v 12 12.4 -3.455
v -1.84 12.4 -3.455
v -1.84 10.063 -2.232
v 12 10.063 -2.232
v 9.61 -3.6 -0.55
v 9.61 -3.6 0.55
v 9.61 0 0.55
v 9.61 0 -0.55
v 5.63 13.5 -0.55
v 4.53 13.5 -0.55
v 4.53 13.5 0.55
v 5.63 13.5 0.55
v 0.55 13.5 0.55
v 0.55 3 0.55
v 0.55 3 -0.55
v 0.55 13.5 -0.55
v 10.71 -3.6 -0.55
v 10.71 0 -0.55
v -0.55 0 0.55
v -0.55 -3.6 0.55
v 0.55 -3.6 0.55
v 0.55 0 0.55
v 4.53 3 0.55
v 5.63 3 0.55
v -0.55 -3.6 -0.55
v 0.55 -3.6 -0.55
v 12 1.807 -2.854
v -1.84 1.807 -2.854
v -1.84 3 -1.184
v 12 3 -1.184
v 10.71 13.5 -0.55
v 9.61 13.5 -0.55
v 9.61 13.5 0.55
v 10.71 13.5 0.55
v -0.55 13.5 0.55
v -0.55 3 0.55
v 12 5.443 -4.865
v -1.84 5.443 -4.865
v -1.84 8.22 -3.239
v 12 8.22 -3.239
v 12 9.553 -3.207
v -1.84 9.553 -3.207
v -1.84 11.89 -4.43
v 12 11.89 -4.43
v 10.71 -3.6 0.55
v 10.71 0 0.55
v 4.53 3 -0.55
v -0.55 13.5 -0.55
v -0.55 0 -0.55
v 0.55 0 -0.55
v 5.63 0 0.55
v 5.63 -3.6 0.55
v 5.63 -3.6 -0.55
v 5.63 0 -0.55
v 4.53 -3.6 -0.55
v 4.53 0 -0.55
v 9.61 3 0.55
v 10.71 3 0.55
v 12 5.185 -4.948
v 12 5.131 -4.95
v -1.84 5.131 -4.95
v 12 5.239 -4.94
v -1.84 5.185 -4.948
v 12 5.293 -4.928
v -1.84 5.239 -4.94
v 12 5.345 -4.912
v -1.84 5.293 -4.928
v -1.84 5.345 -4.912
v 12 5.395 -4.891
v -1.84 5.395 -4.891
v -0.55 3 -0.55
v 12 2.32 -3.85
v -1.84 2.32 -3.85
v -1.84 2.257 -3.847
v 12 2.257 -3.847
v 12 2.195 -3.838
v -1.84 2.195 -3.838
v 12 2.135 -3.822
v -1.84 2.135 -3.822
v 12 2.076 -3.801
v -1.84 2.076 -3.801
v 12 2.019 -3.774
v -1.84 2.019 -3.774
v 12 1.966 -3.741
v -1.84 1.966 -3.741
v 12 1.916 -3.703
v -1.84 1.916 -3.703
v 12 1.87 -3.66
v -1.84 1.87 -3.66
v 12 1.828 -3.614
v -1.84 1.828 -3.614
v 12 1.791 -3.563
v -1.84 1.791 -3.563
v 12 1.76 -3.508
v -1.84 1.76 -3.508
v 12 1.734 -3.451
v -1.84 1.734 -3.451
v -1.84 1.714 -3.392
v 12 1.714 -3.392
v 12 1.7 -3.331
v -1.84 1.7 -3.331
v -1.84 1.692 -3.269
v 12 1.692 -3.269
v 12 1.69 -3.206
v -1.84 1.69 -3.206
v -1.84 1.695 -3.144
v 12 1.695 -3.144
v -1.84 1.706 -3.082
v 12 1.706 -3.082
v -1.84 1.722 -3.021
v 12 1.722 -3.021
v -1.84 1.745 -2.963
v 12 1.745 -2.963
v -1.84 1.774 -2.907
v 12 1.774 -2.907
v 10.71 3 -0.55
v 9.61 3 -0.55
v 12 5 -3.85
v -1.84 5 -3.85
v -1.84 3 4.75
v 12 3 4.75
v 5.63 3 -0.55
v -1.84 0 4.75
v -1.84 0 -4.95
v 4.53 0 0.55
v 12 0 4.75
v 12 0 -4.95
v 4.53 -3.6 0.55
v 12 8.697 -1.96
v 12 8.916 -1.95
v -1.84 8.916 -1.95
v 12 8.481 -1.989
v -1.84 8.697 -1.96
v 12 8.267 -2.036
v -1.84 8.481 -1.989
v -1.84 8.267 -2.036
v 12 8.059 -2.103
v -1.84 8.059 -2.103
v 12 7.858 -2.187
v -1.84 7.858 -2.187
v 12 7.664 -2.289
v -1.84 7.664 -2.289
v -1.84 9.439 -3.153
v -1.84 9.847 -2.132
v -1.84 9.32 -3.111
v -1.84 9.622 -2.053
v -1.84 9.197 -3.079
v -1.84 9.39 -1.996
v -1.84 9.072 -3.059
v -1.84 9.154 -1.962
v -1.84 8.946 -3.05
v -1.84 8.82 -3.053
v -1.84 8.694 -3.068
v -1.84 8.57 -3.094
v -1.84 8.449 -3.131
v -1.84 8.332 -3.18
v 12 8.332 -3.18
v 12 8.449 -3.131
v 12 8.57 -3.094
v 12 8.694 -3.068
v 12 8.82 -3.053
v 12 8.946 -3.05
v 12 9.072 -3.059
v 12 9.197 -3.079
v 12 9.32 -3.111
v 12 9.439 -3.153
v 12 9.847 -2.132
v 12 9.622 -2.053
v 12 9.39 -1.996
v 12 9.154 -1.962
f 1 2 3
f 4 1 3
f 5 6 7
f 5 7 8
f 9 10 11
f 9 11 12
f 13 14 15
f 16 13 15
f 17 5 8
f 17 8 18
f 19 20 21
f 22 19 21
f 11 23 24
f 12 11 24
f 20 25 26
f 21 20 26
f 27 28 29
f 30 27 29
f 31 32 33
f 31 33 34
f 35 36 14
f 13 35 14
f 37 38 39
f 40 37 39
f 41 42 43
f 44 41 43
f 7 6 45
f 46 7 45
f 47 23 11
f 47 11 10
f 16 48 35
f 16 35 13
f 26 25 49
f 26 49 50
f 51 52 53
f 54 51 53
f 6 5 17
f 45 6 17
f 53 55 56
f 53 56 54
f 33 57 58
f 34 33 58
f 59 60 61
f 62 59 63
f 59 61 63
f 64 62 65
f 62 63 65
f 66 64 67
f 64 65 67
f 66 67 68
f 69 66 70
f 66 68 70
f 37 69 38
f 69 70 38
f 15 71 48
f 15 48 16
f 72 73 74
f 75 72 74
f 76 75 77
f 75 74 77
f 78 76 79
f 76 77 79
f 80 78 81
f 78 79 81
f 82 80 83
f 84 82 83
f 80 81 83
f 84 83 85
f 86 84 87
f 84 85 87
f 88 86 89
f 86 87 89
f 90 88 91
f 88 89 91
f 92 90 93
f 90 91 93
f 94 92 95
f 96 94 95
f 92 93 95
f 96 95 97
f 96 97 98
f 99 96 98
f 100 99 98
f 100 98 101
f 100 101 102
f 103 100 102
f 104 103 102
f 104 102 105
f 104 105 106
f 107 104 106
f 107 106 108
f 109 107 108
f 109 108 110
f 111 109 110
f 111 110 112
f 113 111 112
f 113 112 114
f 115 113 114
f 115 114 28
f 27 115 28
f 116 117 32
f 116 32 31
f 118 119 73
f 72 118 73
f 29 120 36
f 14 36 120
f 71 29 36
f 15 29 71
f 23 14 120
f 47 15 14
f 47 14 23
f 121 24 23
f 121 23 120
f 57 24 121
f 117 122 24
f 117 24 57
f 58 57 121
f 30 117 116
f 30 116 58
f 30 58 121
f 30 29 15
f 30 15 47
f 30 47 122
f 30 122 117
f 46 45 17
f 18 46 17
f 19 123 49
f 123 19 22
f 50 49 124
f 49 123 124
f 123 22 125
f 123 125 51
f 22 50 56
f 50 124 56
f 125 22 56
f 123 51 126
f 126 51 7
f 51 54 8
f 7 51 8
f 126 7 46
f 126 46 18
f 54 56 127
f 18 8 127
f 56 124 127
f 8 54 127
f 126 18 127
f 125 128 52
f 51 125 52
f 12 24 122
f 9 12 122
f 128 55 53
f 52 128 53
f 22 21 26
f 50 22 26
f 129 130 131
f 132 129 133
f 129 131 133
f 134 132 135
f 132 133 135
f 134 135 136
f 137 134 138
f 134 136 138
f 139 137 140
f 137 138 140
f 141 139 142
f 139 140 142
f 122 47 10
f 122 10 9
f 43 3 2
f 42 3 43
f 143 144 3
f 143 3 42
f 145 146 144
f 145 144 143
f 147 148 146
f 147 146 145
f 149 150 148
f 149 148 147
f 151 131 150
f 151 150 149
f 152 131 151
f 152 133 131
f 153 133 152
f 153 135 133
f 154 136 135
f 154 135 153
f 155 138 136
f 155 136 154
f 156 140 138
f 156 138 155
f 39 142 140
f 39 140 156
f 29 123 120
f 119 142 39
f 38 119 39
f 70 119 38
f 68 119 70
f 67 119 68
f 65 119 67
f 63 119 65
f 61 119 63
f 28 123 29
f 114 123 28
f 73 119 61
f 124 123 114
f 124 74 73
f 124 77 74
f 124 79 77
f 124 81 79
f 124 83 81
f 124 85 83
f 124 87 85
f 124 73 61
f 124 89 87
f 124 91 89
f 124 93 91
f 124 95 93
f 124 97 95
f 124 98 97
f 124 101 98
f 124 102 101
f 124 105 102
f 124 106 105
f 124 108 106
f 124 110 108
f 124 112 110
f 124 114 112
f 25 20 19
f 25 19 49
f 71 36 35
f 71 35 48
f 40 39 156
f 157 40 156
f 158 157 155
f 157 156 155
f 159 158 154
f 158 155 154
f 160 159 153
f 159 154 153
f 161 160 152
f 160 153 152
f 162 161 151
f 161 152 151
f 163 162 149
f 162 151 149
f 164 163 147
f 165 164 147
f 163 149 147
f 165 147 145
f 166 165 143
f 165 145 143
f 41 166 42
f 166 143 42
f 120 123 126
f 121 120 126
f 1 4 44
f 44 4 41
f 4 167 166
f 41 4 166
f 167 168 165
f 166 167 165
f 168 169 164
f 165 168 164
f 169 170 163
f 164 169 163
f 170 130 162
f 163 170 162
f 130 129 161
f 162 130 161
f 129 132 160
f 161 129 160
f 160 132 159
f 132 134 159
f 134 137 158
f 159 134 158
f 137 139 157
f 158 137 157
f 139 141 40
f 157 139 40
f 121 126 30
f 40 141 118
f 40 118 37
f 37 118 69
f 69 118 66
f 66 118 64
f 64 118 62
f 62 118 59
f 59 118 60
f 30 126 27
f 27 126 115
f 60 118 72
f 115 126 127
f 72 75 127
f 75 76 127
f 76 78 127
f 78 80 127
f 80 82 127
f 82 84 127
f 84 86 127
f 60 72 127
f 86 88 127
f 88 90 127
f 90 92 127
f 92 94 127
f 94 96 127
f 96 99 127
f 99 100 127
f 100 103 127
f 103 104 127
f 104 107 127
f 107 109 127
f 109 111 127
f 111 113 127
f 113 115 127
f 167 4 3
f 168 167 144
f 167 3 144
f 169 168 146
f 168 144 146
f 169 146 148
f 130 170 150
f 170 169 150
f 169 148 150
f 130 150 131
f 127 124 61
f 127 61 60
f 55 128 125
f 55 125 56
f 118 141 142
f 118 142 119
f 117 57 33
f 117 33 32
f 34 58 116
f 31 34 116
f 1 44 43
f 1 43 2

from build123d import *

# Parameters (mm, degrees)
CROQUIS1_W                   = 13.84
CROQUIS1_H                   = 9.7
CROQUIS1_W_2                 = 1.1
CROQUIS1_H_2                 = 1.1
SALIENTE_EXTRUIR1_DEPTH      = 3
CROQUIS2_W                   = 13.84
CROQUIS2_H                   = 3
SALIENTE_EXTRUIR2_DEPTH      = 9.4
CORTAR_EXTRUIR1_DEPTH        = 16.490841585
SALIENTE_EXTRUIR3_DEPTH      = 13.5
SALIENTE_EXTRUIR3_DEPTH_BACK = 3.6
CROQUIS5_W                   = 1.1
CROQUIS5_H                   = 1.1


with BuildPart() as part:
    # Croquis1 → Saliente-Extruir1 (new body)
    with BuildSketch(Plane(origin=(0, 0, 0), x_dir=(1, 0, 0), z_dir=(0, 1, 0))):
        with Locations((5.08, 0.1)):
            Rectangle(CROQUIS1_W, CROQUIS1_H)
        Rectangle(CROQUIS1_W_2, CROQUIS1_H_2, mode=Mode.SUBTRACT)
        with Locations((10.16, 0)):
            Rectangle(CROQUIS1_W_2, CROQUIS1_H_2, mode=Mode.SUBTRACT)
        with Locations((5.08, 0)):
            Rectangle(CROQUIS1_W_2, CROQUIS1_H_2, mode=Mode.SUBTRACT)
    extrude(amount=SALIENTE_EXTRUIR1_DEPTH)

    # Croquis2 → Saliente-Extruir2 (add)
    with BuildSketch(Plane(origin=(0, 3, 0), x_dir=(1, 0, 0), z_dir=(0, 1, 0))):
        with Locations((5.08, 3.45)):
            Rectangle(CROQUIS2_W, CROQUIS2_H)
    extrude(amount=SALIENTE_EXTRUIR2_DEPTH)

    # Croquis3 → Cortar-Extruir1 (cut)
    with BuildSketch(Plane.ZY.offset(1.84)):
        with BuildLine():
            Line((-4.95, 12.4), (-4.95, 5.130923429))
            ThreePointArc((-4.95, 5.130923429), (-4.928460036, 5.292584893), (-4.865343077, 5.442966568))
            Line((-4.865343077, 5.442966568), (-3.238584298, 8.220392257))
            ThreePointArc((-3.238584298, 8.220392257), (-3.050389859, 8.882763545), (-3.206840185, 9.553342522))
            Line((-3.206840185, 9.553342522), (-4.429874218, 11.889875107))
            Line((-4.429874218, 11.889875107), (-3.455311447, 12.4))
            Line((-3.455311447, 12.4), (-4.95, 12.4))
        make_face()
        with BuildLine():
            Line((-1.95, 12.4), (-3.455311447, 12.4))
            Line((-3.455311447, 12.4), (-2.232277415, 10.063467416))
            ThreePointArc((-2.232277415, 10.063467416), (-2.021605007, 9.506586156), (-1.95, 8.9155089))
            Line((-1.95, 8.9155089), (-1.95, 12.4))
        make_face()
        with BuildLine():
            Line((-1.95, 3), (-1.95, 8.9155089))
            ThreePointArc((-1.95, 8.9155089), (-2.036358841, 8.267369623), (-2.28940975, 7.664453701))
            Line((-2.28940975, 7.664453701), (-3.85, 5))
            Line((-3.85, 5), (-3.85, 2.319959731))
            ThreePointArc((-3.85, 2.319959731), (-3.508458272, 1.760049187), (-2.854318236, 1.807497933))
            Line((-2.854318236, 1.807497933), (-1.184444515, 3))
            Line((-1.184444515, 3), (-1.95, 3))
        make_face()
    extrude(amount=-CORTAR_EXTRUIR1_DEPTH, mode=Mode.SUBTRACT)

    # Croquis5 → Saliente-Extruir3 (add, two sides: drawn at the far end of the back side and taken through both)
    with BuildSketch(Plane(origin=(0, 0, 0), x_dir=(1, 0, 0), z_dir=(0, 1, 0)).offset(-SALIENTE_EXTRUIR3_DEPTH_BACK)):
        with Locations((10.16, 0)):
            Rectangle(CROQUIS5_W, CROQUIS5_H)
        Rectangle(CROQUIS5_W, CROQUIS5_H)
        with Locations((5.08, 0)):
            Rectangle(CROQUIS5_W, CROQUIS5_H)
    extrude(amount=SALIENTE_EXTRUIR3_DEPTH + SALIENTE_EXTRUIR3_DEPTH_BACK)


solid = part.part
